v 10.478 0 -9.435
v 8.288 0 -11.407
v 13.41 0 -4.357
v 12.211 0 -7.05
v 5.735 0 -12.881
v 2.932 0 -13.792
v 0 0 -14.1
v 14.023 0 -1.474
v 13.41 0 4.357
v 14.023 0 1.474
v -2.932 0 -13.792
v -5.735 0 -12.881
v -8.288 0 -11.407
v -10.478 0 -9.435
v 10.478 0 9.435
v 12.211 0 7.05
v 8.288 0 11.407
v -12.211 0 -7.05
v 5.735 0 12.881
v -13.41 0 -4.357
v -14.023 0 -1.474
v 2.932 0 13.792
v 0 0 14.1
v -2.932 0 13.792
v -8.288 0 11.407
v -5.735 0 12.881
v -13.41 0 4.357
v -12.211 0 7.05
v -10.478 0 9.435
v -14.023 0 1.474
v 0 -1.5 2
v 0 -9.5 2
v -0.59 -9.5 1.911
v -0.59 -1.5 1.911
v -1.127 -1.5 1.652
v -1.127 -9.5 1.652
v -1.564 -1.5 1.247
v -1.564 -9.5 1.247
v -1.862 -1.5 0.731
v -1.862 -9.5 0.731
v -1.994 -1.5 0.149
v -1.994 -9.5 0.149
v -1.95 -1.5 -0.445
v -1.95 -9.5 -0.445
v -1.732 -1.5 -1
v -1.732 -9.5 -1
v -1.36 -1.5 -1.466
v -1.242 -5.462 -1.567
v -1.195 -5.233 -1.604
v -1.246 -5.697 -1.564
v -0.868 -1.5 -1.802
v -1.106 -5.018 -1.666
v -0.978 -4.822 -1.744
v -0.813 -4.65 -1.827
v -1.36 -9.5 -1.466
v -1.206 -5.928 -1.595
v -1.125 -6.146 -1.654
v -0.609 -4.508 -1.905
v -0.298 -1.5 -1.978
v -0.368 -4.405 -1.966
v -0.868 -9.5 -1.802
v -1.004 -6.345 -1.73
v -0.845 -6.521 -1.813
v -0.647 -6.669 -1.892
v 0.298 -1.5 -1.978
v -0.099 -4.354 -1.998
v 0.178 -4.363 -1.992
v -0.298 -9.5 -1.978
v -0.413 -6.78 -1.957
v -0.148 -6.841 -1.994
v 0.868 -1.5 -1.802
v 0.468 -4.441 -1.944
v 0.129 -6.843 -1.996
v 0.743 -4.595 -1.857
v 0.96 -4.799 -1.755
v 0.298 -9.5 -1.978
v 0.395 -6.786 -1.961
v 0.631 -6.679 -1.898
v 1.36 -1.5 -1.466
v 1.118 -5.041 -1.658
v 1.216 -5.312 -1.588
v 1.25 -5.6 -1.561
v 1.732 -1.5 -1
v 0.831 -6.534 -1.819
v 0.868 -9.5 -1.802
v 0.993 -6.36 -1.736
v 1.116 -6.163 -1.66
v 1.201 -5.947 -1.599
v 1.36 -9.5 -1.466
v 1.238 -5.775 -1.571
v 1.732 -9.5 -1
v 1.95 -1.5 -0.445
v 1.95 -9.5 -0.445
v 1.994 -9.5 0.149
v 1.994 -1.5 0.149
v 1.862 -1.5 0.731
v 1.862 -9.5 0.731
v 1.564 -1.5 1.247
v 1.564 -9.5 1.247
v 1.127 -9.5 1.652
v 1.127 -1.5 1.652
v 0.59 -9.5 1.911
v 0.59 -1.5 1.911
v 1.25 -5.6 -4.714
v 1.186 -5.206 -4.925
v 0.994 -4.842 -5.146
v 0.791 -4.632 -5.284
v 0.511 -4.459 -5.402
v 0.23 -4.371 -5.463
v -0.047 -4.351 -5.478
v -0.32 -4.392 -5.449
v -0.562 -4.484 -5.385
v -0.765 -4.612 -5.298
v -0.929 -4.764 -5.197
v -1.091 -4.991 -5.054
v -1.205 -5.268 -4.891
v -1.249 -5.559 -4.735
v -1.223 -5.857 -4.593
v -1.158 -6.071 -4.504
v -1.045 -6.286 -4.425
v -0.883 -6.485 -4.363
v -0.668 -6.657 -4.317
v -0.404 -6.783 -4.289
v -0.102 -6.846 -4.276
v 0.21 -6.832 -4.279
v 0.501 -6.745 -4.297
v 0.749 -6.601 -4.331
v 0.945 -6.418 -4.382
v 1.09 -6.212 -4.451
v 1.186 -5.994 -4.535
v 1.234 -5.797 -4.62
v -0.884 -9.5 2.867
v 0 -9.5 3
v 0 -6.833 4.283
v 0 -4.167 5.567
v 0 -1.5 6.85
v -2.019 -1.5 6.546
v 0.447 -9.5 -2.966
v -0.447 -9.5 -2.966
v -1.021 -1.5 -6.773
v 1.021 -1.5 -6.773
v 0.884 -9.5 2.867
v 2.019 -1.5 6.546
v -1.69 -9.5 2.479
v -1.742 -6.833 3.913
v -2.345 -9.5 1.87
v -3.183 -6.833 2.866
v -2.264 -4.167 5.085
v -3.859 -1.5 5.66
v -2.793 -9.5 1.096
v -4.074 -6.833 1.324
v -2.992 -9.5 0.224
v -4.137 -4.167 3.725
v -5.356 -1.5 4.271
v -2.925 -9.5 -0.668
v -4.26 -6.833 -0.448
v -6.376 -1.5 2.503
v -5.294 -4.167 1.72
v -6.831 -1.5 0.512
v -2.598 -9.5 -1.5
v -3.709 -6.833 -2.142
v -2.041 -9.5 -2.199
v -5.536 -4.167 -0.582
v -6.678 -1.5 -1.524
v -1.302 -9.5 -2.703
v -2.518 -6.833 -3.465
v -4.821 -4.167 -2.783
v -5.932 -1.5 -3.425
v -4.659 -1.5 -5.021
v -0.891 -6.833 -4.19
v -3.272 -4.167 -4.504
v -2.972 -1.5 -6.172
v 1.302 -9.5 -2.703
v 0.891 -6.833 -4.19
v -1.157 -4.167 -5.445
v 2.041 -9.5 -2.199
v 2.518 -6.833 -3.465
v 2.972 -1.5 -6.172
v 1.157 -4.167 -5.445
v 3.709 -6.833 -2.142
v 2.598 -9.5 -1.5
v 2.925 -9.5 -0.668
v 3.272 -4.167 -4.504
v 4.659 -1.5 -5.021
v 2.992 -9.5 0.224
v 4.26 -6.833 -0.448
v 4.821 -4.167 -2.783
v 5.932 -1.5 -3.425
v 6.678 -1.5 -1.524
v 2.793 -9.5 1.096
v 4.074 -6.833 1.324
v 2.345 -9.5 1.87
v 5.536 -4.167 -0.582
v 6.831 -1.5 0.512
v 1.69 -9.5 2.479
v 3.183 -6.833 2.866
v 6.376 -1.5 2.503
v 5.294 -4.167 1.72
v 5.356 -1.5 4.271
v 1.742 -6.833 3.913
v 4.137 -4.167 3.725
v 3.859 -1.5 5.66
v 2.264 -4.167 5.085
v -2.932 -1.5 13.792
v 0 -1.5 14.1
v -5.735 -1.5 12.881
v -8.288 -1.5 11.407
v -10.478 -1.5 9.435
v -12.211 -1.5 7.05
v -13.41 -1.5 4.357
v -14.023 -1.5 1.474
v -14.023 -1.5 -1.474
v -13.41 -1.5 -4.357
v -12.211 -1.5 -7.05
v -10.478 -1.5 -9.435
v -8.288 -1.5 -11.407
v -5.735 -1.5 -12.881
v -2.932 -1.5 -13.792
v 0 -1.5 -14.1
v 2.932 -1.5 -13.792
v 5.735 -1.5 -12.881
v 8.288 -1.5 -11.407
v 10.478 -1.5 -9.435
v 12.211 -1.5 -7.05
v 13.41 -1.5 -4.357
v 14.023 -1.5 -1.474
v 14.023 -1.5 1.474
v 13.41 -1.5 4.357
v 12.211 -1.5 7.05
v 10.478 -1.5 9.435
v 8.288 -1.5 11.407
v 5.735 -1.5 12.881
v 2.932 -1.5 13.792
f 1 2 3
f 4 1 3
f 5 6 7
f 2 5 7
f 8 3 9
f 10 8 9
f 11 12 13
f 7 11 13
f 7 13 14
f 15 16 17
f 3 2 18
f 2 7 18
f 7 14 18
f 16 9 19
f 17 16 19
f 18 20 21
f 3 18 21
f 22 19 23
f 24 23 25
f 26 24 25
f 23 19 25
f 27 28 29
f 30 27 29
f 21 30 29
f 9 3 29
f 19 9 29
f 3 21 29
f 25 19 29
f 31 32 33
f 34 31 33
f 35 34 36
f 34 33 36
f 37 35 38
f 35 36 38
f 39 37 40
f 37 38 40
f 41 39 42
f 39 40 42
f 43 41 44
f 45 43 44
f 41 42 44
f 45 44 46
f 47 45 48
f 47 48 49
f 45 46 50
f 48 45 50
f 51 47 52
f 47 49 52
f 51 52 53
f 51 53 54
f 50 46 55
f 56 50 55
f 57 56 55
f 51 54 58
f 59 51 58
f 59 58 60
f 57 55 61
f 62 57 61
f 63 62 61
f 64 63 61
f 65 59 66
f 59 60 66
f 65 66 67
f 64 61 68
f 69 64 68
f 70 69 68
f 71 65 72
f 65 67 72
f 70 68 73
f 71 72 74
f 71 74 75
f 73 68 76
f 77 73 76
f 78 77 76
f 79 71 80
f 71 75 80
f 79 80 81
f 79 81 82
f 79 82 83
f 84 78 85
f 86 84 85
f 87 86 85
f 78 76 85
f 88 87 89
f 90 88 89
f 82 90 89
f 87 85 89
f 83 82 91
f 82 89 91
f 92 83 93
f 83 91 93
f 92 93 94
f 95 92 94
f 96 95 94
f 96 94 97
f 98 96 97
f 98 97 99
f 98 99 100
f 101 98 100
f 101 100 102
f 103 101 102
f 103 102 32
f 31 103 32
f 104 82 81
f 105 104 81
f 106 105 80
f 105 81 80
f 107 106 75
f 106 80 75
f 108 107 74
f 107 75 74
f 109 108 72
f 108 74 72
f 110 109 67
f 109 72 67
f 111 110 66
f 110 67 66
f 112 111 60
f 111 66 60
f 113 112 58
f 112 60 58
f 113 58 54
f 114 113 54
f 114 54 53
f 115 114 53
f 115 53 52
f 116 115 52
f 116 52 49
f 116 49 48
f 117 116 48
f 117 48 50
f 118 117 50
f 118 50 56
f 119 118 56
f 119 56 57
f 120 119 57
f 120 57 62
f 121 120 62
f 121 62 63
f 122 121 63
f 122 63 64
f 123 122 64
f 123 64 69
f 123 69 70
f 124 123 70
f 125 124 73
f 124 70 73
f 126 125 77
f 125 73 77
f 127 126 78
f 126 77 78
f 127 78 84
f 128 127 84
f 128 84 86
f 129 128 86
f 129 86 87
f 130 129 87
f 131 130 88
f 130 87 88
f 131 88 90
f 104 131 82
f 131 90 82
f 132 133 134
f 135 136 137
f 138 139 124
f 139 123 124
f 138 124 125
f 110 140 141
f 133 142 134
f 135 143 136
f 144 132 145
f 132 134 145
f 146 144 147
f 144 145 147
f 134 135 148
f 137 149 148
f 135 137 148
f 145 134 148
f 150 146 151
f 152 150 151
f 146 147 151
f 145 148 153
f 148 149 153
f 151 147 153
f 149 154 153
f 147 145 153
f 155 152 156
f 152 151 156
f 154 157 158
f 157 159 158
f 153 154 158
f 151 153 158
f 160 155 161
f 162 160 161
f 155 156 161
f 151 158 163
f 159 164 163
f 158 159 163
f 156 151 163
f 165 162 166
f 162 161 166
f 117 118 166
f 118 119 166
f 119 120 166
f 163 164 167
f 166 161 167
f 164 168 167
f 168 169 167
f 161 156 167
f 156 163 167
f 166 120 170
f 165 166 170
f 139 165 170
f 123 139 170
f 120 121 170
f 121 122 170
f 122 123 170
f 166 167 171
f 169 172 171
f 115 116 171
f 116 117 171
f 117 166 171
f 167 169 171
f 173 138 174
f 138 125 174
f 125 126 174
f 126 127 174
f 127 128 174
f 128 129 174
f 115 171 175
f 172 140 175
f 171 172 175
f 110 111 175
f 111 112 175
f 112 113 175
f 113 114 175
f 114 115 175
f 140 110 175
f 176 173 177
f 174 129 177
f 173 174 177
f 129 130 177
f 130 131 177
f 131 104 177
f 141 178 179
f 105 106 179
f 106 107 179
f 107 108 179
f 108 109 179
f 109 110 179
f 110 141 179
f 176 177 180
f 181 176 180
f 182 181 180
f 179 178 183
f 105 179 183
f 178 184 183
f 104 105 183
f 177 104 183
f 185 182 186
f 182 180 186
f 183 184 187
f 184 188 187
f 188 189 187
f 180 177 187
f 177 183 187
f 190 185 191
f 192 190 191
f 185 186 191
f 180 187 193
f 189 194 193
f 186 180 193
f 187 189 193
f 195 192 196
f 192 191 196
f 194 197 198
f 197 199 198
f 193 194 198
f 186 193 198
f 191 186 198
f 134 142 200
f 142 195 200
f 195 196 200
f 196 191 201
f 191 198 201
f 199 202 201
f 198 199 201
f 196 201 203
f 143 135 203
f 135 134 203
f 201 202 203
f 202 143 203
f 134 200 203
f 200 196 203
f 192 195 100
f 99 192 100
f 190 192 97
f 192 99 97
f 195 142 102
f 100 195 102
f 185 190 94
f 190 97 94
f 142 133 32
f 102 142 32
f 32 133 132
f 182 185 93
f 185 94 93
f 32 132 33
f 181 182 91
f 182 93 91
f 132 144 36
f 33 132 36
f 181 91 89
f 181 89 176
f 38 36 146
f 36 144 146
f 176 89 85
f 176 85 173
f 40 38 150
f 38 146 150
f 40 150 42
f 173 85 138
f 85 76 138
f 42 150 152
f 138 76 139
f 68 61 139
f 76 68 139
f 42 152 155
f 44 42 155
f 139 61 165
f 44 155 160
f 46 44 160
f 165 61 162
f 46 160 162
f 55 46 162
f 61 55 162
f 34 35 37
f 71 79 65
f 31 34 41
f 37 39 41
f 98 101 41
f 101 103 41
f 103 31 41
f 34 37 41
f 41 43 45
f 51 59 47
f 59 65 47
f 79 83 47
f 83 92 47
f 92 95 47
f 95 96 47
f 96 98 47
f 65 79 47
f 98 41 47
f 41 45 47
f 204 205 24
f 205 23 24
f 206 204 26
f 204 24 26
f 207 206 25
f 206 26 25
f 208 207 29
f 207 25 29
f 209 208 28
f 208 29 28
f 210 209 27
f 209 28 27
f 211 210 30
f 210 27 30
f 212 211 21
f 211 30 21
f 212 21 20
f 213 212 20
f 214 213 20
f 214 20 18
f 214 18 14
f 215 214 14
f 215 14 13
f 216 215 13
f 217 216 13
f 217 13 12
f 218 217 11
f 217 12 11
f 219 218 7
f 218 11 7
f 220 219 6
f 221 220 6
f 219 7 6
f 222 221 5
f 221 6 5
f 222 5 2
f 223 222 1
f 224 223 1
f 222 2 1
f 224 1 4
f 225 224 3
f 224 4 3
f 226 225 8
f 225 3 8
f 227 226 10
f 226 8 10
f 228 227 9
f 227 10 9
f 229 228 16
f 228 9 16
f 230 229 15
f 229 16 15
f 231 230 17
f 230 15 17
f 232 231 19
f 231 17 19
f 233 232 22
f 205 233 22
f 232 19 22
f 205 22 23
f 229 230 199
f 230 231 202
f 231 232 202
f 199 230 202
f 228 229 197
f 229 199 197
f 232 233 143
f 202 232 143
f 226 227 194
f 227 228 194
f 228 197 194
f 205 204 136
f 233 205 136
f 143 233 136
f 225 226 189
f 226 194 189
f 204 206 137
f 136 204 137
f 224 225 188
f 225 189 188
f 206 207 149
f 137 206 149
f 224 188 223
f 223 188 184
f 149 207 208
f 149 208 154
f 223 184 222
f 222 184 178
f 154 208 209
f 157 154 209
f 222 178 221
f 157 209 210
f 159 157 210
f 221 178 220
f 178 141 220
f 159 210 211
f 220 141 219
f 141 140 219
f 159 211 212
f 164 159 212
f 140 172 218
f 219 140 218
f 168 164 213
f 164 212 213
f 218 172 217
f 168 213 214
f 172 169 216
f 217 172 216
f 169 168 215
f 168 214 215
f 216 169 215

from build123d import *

# Parameters (mm, degrees)
SKETCH2_R          = 1.25
CUT_EXTRUDE1_DEPTH = 10


with BuildPart() as part:
    # Sketch1 → Revolve1 (revolve)
    with BuildSketch(Plane.XY, mode=Mode.PRIVATE) as revolve1_sk:
        Polygon((0, 0), (0, -1.5), (2, -1.5), (2, -9.5), (3, -9.5), (6.85, -1.5), (14.1, -1.5), (14.1, 0), align=None)
    revolve(revolve1_sk.sketch.rotate(Axis((0, 0, 0), (0, -1, 0)), 90), axis=Axis((0, 0, 0), (0, -1, 0)))

    # Sketch2 → Cut-Extrude1 (cut)
    with BuildSketch(Plane.XY):
        with Locations((0, -5.6)):
            Circle(SKETCH2_R)
    extrude(amount=-CUT_EXTRUDE1_DEPTH, mode=Mode.SUBTRACT)


solid = part.part
